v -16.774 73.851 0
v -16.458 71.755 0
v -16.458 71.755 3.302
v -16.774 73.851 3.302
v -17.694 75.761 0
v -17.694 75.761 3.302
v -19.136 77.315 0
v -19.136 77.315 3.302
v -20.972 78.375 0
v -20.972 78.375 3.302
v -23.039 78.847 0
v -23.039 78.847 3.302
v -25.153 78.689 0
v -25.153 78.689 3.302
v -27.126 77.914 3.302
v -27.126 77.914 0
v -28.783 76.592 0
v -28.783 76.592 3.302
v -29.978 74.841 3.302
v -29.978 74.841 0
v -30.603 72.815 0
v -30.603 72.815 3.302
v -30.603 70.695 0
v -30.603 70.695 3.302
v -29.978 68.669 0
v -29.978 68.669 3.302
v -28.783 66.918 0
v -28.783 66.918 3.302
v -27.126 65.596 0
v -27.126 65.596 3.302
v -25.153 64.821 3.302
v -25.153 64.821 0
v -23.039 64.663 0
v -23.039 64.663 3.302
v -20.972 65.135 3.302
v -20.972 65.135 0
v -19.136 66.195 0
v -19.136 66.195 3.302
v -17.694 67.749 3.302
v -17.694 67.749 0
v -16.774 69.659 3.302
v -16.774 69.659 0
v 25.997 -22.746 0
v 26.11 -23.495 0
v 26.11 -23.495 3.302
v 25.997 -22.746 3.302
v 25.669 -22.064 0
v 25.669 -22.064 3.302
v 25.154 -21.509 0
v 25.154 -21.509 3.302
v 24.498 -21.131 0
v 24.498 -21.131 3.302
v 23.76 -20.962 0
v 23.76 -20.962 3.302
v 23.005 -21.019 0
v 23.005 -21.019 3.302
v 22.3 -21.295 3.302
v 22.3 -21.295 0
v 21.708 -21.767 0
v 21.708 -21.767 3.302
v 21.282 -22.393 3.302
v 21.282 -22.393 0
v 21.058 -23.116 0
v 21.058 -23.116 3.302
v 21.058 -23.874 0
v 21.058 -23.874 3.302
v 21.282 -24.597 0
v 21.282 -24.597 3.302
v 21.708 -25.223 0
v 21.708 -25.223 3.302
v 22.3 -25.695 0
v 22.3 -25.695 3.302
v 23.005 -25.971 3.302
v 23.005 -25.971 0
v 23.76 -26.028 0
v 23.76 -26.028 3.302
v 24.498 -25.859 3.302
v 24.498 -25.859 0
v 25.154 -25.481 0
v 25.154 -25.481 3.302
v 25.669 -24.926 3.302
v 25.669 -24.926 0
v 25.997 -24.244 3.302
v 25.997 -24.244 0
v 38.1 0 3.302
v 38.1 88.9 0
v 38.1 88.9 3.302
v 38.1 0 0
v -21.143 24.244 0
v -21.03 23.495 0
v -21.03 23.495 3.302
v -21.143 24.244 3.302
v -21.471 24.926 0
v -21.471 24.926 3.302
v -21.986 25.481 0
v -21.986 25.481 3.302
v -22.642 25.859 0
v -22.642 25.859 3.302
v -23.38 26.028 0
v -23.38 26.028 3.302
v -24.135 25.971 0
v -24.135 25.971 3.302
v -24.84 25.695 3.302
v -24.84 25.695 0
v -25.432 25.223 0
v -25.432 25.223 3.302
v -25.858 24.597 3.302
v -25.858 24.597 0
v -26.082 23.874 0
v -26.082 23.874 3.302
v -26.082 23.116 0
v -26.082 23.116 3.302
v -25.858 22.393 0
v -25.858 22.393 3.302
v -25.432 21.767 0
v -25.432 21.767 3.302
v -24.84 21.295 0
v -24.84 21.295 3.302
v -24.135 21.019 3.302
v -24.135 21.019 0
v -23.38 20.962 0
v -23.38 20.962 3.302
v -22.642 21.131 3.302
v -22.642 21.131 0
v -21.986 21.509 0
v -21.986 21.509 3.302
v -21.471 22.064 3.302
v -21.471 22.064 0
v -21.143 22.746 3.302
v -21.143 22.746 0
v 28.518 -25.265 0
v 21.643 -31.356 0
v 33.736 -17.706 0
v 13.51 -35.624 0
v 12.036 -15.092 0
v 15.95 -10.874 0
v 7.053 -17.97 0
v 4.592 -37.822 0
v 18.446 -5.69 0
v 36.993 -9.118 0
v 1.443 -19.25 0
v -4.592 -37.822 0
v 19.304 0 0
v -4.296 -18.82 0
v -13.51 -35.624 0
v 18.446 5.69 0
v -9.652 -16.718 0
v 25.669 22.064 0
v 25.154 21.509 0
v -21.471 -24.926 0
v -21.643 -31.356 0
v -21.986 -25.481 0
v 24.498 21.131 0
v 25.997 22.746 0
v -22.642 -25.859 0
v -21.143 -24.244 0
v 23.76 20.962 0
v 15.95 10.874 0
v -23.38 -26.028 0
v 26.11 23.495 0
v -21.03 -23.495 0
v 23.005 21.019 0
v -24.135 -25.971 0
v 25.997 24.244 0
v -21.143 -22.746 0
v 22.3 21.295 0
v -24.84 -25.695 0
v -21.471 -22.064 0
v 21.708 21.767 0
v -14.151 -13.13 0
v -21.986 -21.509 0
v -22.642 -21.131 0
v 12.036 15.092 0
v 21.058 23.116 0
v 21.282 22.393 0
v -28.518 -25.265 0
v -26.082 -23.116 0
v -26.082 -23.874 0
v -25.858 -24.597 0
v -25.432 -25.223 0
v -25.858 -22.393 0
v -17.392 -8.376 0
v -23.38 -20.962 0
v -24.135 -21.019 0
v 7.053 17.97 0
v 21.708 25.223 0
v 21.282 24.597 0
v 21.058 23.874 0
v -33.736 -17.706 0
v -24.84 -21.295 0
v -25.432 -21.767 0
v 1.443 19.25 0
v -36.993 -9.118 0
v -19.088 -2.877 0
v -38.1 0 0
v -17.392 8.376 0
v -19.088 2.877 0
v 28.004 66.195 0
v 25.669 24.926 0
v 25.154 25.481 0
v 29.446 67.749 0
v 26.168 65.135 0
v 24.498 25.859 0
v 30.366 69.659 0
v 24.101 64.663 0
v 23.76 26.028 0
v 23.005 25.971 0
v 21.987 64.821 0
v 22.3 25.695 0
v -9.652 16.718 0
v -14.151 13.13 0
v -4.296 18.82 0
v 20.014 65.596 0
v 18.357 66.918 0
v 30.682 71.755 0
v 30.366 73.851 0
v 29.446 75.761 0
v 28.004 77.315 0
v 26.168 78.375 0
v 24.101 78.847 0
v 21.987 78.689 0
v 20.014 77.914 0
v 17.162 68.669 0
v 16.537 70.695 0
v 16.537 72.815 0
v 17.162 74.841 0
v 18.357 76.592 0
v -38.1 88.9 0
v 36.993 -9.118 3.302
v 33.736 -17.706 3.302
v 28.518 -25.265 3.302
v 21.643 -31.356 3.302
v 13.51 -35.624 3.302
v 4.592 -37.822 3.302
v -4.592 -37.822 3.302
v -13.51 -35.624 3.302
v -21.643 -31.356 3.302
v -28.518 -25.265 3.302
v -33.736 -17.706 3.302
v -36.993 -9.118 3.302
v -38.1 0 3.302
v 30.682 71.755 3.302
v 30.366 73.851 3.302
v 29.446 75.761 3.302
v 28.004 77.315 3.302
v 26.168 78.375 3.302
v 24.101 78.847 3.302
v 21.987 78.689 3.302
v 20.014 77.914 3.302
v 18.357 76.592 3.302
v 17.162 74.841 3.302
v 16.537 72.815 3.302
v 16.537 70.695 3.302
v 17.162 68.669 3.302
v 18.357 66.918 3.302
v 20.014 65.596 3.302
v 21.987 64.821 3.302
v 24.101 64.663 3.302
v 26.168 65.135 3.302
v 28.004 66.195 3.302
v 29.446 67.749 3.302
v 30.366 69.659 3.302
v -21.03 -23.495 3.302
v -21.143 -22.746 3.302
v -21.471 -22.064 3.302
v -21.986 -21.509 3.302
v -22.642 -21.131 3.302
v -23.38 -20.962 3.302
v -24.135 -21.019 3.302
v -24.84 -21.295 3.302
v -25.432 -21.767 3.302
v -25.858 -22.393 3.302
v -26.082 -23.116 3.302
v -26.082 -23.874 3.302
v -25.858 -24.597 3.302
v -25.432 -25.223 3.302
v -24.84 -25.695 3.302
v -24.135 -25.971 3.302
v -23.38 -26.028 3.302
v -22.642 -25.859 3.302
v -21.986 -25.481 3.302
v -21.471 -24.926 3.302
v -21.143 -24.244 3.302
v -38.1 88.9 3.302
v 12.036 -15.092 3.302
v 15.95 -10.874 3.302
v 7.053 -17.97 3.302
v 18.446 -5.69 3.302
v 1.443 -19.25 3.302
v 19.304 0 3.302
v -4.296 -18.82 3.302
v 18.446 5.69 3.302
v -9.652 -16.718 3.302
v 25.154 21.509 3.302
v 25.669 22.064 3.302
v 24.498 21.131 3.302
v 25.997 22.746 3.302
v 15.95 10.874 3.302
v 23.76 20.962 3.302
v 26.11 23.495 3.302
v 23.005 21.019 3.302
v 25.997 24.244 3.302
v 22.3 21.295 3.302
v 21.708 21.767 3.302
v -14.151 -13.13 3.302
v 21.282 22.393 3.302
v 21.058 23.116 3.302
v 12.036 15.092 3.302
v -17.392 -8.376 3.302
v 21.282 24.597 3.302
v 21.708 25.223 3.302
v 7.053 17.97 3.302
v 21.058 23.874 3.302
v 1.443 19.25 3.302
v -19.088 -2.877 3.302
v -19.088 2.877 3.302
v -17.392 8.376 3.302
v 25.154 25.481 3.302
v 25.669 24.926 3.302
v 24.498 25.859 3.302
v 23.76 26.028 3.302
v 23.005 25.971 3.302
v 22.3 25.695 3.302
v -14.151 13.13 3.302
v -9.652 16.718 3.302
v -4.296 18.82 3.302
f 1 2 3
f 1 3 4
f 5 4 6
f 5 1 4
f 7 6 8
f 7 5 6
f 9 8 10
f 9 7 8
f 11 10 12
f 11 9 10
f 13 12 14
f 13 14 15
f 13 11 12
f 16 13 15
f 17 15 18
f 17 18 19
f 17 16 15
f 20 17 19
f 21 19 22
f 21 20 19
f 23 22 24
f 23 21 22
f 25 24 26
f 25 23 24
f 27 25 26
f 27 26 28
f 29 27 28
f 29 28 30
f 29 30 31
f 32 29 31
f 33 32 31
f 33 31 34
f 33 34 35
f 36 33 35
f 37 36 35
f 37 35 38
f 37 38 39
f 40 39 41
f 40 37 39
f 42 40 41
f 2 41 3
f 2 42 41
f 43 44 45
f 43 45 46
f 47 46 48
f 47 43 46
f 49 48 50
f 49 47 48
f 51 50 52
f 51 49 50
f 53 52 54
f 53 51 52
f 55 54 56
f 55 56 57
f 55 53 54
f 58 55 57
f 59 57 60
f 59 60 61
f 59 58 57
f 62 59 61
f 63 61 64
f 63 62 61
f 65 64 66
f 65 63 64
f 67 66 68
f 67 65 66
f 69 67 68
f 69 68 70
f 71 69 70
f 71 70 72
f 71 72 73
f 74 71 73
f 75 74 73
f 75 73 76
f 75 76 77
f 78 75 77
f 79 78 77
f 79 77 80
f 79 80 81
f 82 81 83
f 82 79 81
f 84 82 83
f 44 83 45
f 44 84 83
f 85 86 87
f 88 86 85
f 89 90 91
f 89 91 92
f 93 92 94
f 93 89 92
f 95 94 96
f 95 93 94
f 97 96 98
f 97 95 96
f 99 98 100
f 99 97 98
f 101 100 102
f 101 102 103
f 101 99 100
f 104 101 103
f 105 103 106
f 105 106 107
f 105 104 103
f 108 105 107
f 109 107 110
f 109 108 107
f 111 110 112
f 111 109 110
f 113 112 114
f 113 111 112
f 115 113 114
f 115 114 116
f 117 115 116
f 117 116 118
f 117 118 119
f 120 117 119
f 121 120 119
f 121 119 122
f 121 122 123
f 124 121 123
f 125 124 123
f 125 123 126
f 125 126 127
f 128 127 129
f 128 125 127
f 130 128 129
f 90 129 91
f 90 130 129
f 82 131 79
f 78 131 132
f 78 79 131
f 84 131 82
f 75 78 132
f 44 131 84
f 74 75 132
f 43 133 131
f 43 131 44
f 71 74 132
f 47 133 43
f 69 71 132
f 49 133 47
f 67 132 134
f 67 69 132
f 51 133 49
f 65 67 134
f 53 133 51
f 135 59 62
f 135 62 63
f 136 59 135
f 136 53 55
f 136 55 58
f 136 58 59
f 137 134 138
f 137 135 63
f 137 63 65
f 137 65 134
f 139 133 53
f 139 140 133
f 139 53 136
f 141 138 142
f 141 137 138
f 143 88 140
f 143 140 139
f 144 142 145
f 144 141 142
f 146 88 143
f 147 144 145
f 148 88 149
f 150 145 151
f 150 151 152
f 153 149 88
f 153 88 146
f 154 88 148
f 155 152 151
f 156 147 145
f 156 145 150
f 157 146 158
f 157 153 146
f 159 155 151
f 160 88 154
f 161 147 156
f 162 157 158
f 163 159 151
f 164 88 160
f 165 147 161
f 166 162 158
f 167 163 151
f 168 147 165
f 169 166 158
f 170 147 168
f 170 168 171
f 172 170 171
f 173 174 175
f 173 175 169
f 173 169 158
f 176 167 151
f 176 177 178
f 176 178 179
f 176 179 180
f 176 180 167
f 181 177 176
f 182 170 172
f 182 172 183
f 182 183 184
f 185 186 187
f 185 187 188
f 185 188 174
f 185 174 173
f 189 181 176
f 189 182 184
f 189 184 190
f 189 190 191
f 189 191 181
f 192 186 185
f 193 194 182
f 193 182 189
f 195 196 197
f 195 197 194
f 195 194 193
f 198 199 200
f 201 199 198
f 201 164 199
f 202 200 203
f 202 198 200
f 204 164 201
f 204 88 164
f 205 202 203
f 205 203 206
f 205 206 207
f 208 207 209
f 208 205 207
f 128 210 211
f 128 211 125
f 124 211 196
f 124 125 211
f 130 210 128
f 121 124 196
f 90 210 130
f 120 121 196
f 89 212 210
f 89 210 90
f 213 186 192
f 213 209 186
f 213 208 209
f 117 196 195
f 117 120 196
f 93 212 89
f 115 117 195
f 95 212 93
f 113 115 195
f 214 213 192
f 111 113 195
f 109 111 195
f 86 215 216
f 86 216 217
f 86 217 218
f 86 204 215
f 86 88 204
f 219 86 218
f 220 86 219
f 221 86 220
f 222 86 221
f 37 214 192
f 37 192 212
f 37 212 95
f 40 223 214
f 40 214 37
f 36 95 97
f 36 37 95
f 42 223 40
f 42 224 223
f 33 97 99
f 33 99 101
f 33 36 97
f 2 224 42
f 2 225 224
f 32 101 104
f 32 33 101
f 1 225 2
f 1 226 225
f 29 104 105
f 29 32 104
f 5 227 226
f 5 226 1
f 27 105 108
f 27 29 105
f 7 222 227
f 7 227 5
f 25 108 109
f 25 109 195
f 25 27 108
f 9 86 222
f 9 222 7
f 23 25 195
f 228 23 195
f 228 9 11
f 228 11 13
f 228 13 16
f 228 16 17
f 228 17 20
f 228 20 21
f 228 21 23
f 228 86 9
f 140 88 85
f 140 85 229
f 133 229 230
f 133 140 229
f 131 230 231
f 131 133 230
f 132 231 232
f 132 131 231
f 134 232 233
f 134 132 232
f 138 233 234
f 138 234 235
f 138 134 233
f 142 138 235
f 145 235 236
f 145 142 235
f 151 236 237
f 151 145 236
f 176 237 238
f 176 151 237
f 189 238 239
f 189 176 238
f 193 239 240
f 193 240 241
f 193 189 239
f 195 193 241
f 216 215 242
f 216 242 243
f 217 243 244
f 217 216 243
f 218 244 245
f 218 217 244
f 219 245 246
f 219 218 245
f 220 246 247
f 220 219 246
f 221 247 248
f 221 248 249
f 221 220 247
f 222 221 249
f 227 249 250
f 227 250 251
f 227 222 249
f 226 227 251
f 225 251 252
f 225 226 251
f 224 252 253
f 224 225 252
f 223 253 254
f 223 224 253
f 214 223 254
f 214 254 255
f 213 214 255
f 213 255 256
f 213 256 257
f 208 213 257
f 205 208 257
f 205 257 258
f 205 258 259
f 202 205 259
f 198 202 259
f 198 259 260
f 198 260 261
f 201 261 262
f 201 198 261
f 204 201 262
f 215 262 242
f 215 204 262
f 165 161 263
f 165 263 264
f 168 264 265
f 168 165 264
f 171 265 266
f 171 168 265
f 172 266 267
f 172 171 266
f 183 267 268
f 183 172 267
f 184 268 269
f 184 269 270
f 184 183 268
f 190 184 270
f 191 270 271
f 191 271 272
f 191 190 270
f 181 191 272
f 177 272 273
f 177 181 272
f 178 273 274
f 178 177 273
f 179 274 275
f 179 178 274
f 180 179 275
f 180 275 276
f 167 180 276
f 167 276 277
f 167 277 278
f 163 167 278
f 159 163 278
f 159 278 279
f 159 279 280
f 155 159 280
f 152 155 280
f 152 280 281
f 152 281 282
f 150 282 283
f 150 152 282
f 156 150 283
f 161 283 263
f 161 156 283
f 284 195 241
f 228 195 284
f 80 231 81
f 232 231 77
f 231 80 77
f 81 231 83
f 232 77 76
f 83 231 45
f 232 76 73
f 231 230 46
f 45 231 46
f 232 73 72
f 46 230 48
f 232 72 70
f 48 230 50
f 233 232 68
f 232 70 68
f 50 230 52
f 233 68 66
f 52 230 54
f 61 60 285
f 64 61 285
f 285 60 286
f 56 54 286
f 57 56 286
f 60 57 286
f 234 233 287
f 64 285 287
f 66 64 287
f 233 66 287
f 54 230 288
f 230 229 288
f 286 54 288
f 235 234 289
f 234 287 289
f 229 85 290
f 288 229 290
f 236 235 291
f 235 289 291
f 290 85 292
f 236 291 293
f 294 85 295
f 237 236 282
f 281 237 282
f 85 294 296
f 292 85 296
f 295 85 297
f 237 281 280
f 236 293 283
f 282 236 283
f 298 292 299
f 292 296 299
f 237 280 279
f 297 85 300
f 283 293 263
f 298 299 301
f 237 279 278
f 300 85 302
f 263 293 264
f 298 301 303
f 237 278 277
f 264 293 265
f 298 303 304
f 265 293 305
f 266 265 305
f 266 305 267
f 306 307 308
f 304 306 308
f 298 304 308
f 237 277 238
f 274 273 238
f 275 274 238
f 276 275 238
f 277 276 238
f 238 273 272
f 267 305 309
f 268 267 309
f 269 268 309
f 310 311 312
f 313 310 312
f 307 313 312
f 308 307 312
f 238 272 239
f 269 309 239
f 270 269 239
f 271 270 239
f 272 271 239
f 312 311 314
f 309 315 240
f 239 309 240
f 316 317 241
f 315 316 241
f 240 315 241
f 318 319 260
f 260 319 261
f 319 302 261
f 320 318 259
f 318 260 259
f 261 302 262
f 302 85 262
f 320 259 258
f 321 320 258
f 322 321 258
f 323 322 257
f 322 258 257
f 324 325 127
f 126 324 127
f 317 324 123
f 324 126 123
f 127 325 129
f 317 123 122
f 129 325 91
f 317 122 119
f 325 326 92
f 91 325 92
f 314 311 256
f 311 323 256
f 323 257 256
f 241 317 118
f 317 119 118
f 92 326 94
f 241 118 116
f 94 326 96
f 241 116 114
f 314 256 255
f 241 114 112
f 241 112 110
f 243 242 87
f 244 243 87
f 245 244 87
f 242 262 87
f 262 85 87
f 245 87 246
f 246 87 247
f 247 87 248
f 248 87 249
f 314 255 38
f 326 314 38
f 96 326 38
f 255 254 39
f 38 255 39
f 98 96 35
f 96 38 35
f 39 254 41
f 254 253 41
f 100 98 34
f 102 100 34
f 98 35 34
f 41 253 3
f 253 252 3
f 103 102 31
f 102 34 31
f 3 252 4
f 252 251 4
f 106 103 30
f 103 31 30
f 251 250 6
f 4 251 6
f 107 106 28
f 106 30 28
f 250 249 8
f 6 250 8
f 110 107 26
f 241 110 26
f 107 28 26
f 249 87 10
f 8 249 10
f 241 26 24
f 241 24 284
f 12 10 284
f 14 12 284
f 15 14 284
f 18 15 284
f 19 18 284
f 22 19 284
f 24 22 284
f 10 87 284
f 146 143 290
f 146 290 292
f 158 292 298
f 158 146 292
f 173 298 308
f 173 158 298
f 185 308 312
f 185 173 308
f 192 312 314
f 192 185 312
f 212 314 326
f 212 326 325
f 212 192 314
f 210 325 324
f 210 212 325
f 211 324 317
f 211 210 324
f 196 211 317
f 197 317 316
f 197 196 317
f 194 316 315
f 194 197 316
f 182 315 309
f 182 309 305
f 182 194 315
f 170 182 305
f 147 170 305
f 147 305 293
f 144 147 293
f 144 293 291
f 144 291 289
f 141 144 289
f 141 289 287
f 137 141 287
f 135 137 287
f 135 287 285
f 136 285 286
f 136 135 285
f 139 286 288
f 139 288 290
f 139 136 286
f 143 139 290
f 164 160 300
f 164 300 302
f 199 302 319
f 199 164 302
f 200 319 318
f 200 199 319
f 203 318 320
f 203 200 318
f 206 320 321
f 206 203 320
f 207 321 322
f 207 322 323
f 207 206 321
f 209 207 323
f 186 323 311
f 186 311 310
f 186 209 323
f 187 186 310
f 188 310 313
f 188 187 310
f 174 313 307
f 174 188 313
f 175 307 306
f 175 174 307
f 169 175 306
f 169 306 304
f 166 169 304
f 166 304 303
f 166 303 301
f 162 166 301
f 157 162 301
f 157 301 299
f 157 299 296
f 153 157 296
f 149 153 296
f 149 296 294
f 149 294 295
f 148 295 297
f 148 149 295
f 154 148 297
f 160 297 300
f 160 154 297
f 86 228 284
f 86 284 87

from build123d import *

# Parameters (mm, degrees)
SKETCH1_R           = 7.112
SKETCH1_R_2         = 2.54
SKETCH1_R_3         = 19.304
BOSS_EXTRUDE1_DEPTH = 3.302


with BuildPart() as part:
    # Sketch1 → Boss-Extrude1 (new body)
    with BuildSketch(Plane.XY):
        with BuildLine():
            Line((-38.1, 0), (-38.1, 88.9))
            Line((-38.1, 88.9), (38.1, 88.9))
            Line((38.1, 88.9), (38.1, 0))
            ThreePointArc((38.1, 0), (0, -38.1), (-38.1, 0))
        make_face()
        with Locations((23.57, 71.755)):
            Circle(SKETCH1_R, mode=Mode.SUBTRACT)
        with Locations((23.57, 23.495)):
            Circle(SKETCH1_R_2, mode=Mode.SUBTRACT)
        with Locations((-23.57, -23.495)):
            Circle(SKETCH1_R_2, mode=Mode.SUBTRACT)
        with Locations((-23.57, 23.495)):
            Circle(SKETCH1_R_2, mode=Mode.SUBTRACT)
        with Locations((-23.57, 71.755)):
            Circle(SKETCH1_R, mode=Mode.SUBTRACT)
        with Locations((23.57, -23.495)):
            Circle(SKETCH1_R_2, mode=Mode.SUBTRACT)
        Circle(SKETCH1_R_3, mode=Mode.SUBTRACT)
    extrude(amount=BOSS_EXTRUDE1_DEPTH)


solid = part.part
